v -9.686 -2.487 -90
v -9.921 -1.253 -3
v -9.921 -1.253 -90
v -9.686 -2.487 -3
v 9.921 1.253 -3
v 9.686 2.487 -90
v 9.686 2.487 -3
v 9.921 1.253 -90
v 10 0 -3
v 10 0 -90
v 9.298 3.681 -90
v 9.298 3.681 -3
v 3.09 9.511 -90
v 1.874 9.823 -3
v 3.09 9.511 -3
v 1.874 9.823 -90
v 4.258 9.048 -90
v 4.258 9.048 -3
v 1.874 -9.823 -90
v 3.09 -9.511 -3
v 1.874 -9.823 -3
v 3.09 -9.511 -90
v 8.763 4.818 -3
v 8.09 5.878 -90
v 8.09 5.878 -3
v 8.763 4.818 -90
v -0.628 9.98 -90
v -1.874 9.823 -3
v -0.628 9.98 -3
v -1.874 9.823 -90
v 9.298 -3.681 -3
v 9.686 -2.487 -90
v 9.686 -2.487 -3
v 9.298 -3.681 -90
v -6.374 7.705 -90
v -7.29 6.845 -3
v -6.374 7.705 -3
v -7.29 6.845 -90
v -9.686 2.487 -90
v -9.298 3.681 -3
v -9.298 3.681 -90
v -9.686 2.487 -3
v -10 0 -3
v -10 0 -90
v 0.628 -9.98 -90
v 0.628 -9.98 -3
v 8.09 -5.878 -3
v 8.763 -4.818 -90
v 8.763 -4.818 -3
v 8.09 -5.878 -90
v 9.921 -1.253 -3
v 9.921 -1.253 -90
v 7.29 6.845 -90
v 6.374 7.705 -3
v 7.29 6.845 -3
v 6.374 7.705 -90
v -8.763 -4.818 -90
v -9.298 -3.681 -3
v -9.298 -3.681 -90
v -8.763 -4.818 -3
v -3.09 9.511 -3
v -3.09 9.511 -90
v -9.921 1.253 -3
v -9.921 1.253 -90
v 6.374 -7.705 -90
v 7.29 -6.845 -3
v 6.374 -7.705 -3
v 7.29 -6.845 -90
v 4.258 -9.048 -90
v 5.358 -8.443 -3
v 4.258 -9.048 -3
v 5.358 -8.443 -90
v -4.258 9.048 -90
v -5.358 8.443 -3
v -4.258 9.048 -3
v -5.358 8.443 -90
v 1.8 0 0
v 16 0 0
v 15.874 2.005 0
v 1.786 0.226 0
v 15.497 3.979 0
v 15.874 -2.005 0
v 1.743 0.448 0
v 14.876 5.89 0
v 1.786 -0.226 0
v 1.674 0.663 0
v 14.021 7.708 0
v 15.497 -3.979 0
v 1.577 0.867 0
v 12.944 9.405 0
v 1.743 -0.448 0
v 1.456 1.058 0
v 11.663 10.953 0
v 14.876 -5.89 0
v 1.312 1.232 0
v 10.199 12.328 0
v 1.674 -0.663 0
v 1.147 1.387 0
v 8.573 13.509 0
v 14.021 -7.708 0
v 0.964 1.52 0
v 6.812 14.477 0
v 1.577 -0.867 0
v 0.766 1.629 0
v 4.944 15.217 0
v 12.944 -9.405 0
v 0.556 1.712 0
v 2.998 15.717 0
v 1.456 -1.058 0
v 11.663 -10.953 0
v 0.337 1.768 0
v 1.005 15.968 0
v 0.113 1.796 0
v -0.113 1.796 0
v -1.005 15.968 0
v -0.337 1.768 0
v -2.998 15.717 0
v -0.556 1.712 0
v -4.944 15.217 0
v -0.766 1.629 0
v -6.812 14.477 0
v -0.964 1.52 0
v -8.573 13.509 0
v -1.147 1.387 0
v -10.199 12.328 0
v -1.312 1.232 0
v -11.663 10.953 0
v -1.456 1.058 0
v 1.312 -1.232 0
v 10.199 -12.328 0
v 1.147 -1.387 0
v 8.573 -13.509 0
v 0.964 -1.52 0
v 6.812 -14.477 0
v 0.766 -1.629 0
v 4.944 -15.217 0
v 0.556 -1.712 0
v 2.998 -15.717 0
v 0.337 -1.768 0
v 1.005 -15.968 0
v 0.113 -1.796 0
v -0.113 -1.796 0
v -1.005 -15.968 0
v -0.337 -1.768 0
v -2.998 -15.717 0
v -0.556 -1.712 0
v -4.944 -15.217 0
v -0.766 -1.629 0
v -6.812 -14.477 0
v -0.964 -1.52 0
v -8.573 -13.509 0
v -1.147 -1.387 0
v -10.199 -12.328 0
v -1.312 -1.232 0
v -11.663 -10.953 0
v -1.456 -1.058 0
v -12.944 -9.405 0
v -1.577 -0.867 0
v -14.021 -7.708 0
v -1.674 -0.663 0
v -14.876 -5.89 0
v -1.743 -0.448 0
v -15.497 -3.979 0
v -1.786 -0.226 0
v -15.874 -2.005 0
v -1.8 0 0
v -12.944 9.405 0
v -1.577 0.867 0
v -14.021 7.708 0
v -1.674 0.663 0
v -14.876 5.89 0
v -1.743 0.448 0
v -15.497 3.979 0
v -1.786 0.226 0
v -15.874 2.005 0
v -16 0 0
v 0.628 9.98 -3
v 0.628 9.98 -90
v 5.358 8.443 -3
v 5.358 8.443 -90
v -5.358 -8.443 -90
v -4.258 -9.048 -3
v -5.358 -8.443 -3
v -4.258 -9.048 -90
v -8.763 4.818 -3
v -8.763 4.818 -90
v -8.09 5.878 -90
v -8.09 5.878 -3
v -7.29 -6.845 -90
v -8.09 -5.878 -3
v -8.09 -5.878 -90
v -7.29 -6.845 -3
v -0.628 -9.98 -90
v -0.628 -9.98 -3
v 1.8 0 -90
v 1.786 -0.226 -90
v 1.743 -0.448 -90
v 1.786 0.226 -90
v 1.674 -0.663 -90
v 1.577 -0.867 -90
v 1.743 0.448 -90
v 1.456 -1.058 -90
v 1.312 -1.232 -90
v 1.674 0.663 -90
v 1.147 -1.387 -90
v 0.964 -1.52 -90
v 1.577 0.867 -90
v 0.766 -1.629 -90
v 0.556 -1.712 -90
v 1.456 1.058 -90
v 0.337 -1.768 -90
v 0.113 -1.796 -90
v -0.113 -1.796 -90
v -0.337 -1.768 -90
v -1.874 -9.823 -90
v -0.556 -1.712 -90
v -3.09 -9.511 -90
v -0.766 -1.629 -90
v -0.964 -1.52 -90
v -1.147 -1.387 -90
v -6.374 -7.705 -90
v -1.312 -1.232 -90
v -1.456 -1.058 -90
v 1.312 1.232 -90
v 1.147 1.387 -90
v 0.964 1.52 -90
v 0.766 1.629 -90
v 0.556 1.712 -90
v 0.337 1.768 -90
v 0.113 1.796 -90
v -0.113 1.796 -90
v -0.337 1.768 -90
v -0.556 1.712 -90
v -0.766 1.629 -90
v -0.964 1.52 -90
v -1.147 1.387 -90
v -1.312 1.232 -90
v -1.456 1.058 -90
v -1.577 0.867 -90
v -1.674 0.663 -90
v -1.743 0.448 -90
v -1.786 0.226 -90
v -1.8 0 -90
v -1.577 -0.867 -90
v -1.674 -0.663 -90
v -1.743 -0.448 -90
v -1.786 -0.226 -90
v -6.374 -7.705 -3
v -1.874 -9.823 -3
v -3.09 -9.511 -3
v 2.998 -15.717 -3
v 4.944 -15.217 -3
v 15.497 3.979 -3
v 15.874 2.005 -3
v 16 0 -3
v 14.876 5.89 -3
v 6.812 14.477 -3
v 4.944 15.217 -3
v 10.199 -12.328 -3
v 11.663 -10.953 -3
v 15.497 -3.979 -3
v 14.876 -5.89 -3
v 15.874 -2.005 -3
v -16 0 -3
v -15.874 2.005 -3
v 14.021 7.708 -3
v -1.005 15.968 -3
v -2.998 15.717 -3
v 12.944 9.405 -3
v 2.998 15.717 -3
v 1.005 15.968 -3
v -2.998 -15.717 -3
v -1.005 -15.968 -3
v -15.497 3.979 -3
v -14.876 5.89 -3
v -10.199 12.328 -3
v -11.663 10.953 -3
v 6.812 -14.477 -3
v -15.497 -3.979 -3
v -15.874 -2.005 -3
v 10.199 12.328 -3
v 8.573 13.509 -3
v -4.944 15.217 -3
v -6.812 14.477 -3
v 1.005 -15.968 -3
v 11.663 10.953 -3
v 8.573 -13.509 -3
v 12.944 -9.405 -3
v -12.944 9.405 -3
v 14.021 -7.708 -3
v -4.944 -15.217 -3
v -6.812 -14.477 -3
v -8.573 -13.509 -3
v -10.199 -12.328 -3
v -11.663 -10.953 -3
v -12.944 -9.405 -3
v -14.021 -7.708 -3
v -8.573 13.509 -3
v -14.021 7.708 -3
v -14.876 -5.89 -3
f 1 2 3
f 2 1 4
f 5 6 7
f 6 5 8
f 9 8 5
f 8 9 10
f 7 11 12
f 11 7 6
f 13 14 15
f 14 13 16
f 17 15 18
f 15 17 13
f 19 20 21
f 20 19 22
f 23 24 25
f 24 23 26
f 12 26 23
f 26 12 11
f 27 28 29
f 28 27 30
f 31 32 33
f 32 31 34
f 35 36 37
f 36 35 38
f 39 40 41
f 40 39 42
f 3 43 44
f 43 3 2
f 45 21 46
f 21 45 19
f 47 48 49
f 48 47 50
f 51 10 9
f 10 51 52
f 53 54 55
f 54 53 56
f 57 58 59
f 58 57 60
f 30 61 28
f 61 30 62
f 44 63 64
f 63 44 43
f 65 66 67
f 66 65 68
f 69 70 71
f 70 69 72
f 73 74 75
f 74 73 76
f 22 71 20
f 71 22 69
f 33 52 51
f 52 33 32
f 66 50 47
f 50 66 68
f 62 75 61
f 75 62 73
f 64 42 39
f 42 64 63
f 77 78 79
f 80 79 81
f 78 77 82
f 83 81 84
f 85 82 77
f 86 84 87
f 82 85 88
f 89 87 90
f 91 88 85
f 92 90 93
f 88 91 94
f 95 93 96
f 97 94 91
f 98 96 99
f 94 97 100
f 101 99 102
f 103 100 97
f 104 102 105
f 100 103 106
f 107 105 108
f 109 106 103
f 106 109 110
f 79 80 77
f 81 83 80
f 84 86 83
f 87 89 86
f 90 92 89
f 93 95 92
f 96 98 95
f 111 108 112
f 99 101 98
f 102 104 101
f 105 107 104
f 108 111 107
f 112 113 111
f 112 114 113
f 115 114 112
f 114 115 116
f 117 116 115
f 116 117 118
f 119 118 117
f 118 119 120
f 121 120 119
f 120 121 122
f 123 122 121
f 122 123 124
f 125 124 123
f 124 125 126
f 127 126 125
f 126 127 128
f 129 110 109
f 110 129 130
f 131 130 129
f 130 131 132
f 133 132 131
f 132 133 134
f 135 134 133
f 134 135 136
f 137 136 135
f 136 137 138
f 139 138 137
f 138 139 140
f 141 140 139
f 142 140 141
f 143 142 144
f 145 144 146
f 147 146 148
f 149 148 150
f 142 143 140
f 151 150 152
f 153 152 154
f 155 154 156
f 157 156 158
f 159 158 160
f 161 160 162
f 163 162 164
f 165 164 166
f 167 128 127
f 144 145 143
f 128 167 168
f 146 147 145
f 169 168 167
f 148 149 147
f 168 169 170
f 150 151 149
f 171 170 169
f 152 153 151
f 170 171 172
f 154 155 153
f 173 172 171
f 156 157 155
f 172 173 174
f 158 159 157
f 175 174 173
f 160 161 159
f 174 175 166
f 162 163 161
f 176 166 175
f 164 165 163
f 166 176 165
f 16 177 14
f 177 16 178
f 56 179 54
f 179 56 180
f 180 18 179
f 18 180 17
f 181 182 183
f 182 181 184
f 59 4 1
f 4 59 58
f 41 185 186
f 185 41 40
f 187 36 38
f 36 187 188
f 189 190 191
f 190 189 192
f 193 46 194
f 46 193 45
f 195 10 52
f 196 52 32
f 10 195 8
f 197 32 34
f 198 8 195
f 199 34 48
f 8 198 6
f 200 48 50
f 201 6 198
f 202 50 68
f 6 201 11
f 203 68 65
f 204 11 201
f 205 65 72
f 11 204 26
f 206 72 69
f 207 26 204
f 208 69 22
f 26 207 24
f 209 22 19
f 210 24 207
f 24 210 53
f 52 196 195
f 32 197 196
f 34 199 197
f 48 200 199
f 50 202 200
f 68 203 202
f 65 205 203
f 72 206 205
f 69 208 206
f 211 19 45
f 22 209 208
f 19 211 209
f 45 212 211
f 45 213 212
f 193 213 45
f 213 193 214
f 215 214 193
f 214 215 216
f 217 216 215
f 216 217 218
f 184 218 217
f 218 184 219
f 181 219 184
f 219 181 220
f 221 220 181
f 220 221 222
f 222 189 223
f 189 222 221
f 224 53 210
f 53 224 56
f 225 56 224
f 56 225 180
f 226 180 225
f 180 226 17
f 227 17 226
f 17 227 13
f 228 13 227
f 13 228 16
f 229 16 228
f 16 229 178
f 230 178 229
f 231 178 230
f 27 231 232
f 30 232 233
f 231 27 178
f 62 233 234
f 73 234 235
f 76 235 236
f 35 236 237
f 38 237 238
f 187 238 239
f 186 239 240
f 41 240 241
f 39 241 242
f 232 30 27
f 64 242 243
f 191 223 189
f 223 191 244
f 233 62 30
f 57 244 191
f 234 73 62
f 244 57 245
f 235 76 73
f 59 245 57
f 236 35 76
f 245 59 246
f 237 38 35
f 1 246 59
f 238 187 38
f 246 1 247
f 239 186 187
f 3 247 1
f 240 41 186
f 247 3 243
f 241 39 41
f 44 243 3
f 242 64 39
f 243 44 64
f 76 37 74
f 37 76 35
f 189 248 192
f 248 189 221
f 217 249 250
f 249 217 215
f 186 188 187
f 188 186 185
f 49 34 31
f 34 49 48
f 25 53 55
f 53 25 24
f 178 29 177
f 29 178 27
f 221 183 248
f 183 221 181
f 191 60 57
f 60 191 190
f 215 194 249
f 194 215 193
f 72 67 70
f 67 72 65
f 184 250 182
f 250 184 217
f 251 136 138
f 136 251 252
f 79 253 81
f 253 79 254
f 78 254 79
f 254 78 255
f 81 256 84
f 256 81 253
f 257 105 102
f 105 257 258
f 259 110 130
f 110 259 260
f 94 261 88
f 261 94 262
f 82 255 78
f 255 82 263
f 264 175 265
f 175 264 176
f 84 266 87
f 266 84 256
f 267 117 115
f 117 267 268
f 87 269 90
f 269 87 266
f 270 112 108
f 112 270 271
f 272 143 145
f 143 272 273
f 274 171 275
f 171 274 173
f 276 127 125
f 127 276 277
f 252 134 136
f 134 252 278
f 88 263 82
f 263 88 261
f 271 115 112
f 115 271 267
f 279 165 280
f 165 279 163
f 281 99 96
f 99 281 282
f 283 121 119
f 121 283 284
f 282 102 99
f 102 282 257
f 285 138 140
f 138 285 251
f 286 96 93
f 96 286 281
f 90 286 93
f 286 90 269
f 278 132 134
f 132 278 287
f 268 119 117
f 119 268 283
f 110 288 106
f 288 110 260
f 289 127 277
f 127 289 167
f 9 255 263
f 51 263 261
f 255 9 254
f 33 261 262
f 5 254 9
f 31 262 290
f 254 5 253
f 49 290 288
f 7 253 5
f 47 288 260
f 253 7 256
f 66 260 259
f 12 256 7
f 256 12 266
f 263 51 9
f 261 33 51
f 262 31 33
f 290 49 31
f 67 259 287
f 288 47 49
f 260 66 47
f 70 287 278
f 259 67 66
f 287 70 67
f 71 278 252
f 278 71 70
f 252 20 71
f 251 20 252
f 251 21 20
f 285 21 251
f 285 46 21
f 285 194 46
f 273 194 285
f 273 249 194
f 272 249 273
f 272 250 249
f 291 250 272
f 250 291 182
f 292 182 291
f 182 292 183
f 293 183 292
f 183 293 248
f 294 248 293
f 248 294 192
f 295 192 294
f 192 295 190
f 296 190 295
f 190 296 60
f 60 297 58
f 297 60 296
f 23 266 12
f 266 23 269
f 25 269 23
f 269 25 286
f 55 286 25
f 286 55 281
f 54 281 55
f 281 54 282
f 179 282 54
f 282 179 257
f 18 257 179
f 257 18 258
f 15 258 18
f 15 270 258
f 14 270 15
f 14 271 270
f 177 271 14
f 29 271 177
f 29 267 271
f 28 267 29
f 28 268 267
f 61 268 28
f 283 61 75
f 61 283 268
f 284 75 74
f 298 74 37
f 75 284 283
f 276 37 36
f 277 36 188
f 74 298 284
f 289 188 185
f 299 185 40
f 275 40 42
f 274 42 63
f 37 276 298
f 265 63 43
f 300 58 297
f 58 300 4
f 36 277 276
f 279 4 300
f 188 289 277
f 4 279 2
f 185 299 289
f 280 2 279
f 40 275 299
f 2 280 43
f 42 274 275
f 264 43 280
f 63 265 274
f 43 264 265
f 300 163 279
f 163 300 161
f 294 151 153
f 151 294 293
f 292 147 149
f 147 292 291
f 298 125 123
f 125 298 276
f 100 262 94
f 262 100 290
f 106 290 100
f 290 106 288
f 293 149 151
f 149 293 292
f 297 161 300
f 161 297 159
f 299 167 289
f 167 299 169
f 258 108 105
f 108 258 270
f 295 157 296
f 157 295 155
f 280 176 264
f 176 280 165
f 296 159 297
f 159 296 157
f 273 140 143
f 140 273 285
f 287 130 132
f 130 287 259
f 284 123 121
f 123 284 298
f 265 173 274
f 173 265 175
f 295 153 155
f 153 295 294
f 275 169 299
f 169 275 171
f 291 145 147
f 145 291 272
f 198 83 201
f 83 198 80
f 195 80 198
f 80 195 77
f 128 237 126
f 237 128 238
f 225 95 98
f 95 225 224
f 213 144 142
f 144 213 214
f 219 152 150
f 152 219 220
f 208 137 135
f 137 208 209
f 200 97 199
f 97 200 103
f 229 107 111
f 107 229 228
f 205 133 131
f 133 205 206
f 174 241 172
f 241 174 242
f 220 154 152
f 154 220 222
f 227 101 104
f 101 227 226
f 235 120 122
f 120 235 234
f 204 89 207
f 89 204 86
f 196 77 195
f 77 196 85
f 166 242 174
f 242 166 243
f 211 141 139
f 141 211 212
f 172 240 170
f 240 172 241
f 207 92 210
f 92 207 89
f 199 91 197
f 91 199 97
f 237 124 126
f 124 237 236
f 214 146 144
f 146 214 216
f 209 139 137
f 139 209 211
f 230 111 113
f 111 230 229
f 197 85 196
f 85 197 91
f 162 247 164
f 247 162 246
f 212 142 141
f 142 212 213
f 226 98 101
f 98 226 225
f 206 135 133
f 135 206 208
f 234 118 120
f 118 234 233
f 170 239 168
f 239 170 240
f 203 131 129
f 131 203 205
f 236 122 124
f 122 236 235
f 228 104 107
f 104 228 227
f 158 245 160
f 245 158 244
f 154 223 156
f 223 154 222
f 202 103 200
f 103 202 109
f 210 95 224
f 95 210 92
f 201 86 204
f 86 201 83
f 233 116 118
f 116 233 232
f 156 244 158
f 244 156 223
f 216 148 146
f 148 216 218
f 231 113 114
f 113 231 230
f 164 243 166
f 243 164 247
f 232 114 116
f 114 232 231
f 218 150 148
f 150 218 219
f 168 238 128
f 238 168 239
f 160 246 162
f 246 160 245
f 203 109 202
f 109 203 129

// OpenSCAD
$fn = 50;


difference() {
	union() {
		translate(v = [0, 0, -90.0000000000]) {
			cylinder(h = 90, r = 10.0000000000);
		}
		translate(v = [0, 0, -3.0000000000]) {
			cylinder(h = 3, r = 16.0000000000);
		}
	}
	union() {
		#translate(v = [0, 0, -90]) {
			cylinder(h = 90, r = 1.8000000000);
		}
	}
}
